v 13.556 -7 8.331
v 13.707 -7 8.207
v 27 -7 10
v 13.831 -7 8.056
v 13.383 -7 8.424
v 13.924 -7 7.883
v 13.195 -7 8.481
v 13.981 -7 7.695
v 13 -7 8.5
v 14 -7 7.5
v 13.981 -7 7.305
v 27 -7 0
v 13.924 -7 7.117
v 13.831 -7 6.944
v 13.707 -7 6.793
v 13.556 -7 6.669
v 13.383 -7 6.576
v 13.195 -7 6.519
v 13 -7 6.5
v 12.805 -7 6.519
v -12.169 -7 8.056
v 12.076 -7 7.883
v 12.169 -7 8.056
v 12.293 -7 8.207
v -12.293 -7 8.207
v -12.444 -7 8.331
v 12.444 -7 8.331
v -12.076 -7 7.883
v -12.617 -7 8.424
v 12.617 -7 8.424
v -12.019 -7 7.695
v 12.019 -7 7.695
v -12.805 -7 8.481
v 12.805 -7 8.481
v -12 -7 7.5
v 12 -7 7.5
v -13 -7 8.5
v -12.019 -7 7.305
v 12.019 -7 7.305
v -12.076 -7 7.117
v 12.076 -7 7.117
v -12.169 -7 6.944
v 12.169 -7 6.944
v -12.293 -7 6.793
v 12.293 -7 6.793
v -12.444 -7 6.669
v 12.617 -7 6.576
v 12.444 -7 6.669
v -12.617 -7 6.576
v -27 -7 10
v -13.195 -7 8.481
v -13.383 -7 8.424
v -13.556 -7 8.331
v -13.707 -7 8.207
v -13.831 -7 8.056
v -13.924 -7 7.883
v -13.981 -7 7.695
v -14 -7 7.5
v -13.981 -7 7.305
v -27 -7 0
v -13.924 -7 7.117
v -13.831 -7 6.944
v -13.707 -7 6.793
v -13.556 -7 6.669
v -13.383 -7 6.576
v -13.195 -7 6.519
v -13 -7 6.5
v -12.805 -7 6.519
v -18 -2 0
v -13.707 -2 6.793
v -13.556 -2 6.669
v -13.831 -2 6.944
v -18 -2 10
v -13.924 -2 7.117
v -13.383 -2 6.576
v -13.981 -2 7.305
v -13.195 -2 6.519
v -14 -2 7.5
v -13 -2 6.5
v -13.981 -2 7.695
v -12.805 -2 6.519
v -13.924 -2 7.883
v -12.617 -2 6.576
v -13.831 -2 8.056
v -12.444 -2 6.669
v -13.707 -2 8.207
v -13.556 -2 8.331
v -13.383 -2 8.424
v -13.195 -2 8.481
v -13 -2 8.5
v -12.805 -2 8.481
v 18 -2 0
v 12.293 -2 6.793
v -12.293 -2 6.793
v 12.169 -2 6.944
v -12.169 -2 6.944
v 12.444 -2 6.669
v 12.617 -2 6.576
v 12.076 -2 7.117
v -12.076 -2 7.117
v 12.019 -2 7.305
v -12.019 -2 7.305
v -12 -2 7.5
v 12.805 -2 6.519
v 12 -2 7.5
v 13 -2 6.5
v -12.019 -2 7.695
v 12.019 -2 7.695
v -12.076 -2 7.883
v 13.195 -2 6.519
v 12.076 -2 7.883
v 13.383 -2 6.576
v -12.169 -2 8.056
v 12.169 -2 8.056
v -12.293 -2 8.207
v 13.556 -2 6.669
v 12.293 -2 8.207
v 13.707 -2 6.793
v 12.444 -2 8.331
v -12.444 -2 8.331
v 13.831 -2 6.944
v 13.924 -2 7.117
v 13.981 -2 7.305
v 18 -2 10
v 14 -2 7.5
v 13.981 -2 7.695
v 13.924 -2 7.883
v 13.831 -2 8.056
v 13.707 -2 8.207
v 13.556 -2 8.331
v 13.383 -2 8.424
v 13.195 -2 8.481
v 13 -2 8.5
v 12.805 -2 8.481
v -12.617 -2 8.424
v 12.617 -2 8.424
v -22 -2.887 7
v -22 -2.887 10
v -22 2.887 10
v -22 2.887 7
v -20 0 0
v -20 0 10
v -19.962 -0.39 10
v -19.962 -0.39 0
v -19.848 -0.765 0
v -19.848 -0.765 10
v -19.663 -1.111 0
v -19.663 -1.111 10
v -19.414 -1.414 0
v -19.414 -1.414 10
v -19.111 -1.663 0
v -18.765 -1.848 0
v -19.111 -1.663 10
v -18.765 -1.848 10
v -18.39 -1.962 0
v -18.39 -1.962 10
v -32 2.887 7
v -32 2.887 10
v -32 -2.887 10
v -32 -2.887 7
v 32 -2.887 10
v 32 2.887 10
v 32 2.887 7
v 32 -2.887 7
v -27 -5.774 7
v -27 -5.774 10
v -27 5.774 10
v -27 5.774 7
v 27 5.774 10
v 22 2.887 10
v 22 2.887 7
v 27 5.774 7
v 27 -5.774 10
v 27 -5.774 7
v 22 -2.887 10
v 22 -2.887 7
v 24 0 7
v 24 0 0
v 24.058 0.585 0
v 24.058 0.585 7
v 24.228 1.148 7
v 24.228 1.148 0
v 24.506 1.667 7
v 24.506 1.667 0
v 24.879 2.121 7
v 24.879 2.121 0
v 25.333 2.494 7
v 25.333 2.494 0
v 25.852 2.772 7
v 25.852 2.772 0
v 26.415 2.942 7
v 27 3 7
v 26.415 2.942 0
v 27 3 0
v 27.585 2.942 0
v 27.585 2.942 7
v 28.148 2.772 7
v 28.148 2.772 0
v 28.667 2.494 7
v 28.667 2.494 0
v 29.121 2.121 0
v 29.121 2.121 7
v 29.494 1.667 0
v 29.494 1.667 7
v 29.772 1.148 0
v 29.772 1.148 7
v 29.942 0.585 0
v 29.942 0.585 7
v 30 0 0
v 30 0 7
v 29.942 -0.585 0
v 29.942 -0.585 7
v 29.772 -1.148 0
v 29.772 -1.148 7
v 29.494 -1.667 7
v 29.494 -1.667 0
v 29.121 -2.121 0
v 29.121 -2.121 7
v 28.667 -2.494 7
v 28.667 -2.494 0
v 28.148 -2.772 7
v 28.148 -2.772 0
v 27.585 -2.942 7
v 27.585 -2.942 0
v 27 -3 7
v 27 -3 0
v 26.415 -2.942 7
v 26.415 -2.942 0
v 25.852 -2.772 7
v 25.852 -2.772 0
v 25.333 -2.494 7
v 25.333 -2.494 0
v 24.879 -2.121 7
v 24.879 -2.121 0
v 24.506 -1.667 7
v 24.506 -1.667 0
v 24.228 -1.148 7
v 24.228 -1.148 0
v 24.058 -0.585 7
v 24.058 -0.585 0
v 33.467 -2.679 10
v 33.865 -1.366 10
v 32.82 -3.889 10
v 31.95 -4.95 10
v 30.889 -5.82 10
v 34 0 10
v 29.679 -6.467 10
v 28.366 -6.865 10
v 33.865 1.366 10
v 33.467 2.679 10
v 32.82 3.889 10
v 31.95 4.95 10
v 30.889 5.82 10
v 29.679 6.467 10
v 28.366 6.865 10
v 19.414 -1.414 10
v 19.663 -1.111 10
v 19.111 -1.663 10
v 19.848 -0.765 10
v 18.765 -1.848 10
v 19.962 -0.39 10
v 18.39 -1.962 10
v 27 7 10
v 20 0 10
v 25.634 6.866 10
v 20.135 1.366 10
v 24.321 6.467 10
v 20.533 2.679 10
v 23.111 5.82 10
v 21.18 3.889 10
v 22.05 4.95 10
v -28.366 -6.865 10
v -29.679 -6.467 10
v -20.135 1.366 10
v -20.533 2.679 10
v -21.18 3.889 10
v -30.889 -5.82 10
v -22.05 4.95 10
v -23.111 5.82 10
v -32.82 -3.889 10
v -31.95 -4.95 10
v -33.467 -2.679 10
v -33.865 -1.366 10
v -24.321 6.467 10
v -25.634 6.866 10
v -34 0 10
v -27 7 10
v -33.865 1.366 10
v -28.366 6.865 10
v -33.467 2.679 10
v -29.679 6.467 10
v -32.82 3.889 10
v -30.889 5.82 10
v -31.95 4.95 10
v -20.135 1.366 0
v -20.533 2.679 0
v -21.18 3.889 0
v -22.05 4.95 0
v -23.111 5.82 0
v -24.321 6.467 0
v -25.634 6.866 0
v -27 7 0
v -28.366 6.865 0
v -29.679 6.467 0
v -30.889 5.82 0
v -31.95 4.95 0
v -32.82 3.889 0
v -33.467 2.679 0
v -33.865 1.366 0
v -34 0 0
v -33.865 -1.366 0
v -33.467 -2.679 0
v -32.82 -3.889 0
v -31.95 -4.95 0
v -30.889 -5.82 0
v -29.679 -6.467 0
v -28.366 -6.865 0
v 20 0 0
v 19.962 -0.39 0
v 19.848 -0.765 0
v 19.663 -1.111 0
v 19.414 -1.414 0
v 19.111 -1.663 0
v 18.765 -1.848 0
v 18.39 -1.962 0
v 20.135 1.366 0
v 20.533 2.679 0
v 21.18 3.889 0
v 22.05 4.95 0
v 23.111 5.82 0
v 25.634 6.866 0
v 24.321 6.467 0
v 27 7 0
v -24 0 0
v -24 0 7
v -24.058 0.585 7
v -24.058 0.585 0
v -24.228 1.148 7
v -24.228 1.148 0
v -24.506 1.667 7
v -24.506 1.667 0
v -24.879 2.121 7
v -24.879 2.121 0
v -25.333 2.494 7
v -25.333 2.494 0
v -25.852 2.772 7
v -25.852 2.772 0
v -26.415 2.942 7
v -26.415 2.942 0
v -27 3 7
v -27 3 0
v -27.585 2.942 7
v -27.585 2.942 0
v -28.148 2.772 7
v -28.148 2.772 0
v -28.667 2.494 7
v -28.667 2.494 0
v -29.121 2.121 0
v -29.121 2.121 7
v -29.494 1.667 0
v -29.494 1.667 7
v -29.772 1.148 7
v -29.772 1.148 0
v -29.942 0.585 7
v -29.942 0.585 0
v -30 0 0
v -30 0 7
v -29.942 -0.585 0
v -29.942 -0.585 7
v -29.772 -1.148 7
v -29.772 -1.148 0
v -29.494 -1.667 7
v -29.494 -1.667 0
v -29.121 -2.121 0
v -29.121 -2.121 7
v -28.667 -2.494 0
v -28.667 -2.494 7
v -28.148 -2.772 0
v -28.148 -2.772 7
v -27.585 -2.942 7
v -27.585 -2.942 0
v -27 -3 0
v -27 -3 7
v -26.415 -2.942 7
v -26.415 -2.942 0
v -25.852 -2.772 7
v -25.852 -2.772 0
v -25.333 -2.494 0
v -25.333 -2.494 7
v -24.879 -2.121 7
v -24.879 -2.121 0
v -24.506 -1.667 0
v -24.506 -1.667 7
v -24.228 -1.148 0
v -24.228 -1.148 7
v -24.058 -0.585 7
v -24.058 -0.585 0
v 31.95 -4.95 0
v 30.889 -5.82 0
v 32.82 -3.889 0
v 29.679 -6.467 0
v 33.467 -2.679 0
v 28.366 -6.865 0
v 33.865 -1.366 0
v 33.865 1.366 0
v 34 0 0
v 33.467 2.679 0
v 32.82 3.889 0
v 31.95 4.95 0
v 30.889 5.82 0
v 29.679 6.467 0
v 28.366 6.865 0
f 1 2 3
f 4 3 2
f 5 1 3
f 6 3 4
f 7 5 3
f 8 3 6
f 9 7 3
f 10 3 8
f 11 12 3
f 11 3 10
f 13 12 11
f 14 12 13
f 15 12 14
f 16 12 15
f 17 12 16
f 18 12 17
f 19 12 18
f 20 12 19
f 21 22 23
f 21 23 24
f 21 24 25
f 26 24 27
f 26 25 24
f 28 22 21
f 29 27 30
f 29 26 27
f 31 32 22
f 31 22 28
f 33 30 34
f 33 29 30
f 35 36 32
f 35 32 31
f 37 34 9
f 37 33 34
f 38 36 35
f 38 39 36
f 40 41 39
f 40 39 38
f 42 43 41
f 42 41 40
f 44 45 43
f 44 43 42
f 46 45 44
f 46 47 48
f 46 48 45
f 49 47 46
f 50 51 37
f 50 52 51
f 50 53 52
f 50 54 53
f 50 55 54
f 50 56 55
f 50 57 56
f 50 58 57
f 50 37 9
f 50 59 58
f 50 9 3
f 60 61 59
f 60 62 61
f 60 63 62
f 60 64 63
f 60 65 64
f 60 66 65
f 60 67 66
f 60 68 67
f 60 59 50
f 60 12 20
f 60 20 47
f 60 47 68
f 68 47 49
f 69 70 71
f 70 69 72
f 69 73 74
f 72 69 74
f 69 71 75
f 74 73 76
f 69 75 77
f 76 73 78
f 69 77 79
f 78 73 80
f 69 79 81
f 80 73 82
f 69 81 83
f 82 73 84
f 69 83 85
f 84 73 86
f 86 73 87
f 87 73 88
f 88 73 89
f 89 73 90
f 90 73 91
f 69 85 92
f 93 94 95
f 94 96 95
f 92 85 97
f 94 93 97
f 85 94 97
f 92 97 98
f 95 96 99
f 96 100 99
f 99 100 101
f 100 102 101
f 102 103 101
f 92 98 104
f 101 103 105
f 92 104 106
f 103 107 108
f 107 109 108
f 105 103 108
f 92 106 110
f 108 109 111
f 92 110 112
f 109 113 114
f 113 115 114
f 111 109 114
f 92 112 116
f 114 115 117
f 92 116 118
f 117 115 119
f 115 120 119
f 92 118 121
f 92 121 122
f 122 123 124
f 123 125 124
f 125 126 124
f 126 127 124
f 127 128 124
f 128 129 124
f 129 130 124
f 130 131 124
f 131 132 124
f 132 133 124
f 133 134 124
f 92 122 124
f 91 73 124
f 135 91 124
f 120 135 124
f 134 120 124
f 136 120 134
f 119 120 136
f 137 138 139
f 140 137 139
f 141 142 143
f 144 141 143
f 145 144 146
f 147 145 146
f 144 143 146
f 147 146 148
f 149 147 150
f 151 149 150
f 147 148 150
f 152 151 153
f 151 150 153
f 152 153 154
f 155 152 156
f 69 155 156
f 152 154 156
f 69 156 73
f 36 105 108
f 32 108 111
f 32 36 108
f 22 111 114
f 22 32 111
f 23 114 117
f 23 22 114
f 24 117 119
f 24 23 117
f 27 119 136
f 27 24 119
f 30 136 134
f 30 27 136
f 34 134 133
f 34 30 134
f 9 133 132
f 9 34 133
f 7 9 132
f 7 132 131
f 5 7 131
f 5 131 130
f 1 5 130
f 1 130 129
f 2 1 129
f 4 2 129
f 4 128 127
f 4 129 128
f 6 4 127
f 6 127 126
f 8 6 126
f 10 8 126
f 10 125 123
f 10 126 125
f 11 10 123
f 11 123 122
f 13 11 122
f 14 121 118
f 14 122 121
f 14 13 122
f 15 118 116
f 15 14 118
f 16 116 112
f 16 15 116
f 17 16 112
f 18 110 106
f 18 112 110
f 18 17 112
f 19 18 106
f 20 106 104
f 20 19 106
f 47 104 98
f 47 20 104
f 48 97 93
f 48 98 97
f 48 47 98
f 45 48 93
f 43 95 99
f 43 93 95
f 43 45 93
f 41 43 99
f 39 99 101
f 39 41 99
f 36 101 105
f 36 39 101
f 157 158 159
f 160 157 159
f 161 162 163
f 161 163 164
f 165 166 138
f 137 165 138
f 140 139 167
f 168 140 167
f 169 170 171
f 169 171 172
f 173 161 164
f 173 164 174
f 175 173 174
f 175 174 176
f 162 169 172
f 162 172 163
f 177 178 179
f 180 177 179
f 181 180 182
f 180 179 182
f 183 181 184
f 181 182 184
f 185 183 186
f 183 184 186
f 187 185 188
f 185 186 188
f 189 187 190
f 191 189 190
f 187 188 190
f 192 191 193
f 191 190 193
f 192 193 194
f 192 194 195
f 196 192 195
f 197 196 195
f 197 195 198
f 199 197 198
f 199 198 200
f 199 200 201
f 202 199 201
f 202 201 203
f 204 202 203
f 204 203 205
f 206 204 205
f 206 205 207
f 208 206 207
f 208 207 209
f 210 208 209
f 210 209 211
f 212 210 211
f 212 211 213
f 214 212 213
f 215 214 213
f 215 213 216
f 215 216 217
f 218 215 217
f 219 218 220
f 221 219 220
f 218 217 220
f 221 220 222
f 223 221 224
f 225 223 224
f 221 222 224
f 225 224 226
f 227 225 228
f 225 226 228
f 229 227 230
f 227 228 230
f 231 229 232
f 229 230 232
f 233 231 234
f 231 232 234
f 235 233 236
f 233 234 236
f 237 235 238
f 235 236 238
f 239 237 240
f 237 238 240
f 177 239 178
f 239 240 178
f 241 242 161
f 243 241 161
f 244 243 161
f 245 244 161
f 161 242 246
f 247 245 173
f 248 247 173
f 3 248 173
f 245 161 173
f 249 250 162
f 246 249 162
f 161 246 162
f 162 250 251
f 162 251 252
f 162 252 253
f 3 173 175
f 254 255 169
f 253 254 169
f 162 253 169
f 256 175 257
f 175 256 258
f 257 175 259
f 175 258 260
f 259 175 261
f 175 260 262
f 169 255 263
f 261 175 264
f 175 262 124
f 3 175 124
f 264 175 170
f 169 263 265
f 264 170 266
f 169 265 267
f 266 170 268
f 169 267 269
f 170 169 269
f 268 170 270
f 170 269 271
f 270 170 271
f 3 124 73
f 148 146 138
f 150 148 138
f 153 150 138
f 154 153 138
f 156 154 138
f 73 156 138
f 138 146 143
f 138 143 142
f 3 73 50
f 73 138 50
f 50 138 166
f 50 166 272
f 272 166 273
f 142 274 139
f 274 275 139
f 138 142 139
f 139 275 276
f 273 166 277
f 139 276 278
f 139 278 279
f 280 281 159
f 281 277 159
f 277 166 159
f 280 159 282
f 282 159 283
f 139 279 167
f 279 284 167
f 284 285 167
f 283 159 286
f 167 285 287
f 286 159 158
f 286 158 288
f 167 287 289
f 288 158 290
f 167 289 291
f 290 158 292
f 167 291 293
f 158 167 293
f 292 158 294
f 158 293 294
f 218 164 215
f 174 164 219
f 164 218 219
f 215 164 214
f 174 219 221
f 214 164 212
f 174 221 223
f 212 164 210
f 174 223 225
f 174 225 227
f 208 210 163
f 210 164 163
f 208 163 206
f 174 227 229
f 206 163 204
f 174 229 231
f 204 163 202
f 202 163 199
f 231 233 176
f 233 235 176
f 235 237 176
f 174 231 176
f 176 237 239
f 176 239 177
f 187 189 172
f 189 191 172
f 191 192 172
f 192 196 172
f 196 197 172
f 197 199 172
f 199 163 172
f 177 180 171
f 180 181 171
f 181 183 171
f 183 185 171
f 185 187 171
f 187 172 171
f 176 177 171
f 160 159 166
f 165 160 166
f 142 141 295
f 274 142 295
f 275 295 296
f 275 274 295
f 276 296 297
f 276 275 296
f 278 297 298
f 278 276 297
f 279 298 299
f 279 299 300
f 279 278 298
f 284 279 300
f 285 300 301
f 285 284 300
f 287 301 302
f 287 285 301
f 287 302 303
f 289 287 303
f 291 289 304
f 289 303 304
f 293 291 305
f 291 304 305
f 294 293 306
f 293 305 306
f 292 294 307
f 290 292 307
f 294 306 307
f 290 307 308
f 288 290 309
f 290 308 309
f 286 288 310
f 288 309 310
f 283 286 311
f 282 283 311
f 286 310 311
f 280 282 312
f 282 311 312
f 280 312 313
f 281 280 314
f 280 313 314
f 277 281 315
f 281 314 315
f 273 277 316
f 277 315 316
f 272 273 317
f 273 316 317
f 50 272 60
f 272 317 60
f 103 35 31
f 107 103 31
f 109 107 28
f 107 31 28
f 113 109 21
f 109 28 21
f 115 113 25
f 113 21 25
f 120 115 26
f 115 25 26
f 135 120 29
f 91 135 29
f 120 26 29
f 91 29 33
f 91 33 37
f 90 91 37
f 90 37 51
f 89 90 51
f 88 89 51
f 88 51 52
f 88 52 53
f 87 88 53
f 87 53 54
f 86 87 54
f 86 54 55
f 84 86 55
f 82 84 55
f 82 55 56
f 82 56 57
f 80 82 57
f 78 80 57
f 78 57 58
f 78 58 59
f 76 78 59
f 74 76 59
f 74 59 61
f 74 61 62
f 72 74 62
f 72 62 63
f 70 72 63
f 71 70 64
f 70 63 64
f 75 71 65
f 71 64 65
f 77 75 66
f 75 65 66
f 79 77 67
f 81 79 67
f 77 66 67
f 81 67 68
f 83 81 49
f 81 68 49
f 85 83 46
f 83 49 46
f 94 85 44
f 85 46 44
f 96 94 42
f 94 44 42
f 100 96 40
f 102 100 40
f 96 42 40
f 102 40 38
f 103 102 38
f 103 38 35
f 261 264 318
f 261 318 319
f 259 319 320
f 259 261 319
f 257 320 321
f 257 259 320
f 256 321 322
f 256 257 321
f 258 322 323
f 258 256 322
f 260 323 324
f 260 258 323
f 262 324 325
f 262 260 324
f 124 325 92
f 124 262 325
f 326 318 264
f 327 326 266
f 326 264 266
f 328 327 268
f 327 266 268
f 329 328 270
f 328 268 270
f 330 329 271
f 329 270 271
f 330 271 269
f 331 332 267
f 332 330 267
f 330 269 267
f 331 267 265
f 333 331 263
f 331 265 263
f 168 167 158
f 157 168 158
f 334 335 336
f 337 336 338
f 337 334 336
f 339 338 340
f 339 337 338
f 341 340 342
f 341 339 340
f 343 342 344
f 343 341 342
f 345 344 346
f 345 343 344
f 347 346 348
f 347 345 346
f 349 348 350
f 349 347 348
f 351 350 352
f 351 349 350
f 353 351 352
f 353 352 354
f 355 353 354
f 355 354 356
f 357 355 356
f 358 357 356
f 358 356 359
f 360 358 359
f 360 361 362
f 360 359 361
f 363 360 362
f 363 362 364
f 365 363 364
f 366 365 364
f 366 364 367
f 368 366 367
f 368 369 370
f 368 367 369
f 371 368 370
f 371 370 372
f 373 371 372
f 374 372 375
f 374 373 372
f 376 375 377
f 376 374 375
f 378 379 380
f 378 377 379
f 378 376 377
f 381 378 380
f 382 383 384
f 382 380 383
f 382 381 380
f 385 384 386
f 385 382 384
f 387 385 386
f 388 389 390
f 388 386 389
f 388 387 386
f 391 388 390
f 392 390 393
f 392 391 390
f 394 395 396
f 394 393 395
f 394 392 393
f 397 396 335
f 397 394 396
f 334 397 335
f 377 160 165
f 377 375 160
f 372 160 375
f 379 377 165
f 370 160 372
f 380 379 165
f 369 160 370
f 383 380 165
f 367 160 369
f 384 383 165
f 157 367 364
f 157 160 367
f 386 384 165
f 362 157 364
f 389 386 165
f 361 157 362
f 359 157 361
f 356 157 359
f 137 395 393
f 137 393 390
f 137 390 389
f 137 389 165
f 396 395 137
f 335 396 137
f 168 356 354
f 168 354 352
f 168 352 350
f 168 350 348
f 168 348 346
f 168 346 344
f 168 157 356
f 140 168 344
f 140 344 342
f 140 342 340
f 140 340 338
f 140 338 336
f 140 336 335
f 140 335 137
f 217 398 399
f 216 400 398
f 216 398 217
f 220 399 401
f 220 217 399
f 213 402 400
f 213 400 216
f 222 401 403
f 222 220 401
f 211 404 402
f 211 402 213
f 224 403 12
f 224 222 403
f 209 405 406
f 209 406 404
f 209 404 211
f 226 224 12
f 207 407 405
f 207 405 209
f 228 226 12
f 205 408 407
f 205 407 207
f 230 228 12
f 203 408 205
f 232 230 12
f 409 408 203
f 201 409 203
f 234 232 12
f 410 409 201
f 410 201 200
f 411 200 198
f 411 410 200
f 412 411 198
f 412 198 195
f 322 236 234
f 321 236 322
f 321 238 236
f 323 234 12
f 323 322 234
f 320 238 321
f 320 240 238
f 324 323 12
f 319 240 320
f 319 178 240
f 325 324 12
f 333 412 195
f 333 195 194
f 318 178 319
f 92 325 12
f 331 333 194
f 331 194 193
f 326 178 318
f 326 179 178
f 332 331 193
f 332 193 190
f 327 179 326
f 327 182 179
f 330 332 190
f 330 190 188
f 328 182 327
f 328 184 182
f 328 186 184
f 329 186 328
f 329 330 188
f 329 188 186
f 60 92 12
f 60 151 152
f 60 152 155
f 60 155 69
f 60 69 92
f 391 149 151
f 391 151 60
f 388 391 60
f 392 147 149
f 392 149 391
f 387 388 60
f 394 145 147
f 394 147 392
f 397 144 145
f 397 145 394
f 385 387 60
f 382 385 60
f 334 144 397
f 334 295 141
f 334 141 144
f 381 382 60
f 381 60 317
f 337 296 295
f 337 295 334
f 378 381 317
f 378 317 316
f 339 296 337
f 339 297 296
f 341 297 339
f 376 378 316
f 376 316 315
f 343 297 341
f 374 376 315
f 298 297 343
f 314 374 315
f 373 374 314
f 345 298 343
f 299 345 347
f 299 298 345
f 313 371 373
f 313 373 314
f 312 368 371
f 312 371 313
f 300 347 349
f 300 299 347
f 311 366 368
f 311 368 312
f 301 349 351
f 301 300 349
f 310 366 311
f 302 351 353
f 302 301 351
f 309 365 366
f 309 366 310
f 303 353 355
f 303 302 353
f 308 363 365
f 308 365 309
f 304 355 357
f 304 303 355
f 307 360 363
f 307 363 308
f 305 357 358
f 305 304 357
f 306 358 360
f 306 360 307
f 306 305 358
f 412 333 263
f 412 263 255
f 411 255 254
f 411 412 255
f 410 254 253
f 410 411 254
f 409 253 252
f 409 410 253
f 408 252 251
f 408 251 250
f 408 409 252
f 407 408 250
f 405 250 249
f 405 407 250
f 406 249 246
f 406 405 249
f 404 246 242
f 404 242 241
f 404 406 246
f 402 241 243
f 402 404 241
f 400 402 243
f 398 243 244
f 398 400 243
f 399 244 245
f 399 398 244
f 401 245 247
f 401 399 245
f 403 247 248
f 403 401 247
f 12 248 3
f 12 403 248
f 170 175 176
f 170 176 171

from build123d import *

# Parameters (mm, degrees)
SKETCH_R        = 3
PAD_DEPTH       = 10
SKETCH001_R     = 1
POCKET_DEPTH    = 90.211236
POCKET001_DEPTH = 3
POCKET002_DEPTH = 86.211236


with BuildPart() as part:
    # Sketch → Pad (new body)
    with BuildSketch(Plane.XY):
        with BuildLine():
            ThreePointArc((-27.000023, 7), (-34, 0), (-27.000023, -7))
            Line((-27.000023, -7), (0, -7))
            Line((0, -7), (0, 7))
            Line((-27.000023, 7), (0, 7))
        make_face()
        with Locations((-27, 0)):
            Circle(SKETCH_R, mode=Mode.SUBTRACT)
    pad = extrude(amount=PAD_DEPTH)

    # Sketch001 → Pocket (cut, through all)
    with BuildSketch(Plane.XZ.offset(7)):
        with Locations((-13, 7.5)):
            Circle(SKETCH001_R)
    pocket = extrude(amount=-POCKET_DEPTH, mode=Mode.SUBTRACT)

    # Sketch002 (on Face5 of Pocket) → Pocket001 (cut)
    with BuildSketch(Plane.XY.offset(10)):
        Polygon((-22, 2.886751), (-27, 5.773503), (-32, 2.886751), (-32, -2.886751), (-27, -5.773503), (-22, -2.886751), align=None)
    pocket001 = extrude(amount=-POCKET001_DEPTH, mode=Mode.SUBTRACT)

    # Sketch003 (on Face5 of Pocket001) → Pocket002 (cut, through all)
    with BuildSketch(Plane.XY.offset(10)):
        with BuildLine():
            Line((0, -2), (-18, -2))
            ThreePointArc((-20, -1.6e-05), (-19.414208, -1.414219), (-18, -2))
            ThreePointArc((-20, -1.6e-05), (-22.050255, 4.94975), (-27.000023, 7))
            Line((-27.000023, 7), (0, 7))
            Line((0, -2), (0, 7))
        make_face()
    pocket002 = extrude(amount=-POCKET002_DEPTH, mode=Mode.SUBTRACT)

    # Mirrored: Pad, Pocket, Pocket001, Pocket002 across Sketch003 V_Axis
    add(pad.mirror(Plane(origin=(0, 0, 10), x_dir=(0, 0, 1), z_dir=(1, 0, 0))))
    add(pocket.mirror(Plane(origin=(0, 0, 10), x_dir=(0, 0, 1), z_dir=(1, 0, 0))), mode=Mode.SUBTRACT)
    add(pocket001.mirror(Plane(origin=(0, 0, 10), x_dir=(0, 0, 1), z_dir=(1, 0, 0))), mode=Mode.SUBTRACT)
    add(pocket002.mirror(Plane(origin=(0, 0, 10), x_dir=(0, 0, 1), z_dir=(1, 0, 0))), mode=Mode.SUBTRACT)


solid = part.part
